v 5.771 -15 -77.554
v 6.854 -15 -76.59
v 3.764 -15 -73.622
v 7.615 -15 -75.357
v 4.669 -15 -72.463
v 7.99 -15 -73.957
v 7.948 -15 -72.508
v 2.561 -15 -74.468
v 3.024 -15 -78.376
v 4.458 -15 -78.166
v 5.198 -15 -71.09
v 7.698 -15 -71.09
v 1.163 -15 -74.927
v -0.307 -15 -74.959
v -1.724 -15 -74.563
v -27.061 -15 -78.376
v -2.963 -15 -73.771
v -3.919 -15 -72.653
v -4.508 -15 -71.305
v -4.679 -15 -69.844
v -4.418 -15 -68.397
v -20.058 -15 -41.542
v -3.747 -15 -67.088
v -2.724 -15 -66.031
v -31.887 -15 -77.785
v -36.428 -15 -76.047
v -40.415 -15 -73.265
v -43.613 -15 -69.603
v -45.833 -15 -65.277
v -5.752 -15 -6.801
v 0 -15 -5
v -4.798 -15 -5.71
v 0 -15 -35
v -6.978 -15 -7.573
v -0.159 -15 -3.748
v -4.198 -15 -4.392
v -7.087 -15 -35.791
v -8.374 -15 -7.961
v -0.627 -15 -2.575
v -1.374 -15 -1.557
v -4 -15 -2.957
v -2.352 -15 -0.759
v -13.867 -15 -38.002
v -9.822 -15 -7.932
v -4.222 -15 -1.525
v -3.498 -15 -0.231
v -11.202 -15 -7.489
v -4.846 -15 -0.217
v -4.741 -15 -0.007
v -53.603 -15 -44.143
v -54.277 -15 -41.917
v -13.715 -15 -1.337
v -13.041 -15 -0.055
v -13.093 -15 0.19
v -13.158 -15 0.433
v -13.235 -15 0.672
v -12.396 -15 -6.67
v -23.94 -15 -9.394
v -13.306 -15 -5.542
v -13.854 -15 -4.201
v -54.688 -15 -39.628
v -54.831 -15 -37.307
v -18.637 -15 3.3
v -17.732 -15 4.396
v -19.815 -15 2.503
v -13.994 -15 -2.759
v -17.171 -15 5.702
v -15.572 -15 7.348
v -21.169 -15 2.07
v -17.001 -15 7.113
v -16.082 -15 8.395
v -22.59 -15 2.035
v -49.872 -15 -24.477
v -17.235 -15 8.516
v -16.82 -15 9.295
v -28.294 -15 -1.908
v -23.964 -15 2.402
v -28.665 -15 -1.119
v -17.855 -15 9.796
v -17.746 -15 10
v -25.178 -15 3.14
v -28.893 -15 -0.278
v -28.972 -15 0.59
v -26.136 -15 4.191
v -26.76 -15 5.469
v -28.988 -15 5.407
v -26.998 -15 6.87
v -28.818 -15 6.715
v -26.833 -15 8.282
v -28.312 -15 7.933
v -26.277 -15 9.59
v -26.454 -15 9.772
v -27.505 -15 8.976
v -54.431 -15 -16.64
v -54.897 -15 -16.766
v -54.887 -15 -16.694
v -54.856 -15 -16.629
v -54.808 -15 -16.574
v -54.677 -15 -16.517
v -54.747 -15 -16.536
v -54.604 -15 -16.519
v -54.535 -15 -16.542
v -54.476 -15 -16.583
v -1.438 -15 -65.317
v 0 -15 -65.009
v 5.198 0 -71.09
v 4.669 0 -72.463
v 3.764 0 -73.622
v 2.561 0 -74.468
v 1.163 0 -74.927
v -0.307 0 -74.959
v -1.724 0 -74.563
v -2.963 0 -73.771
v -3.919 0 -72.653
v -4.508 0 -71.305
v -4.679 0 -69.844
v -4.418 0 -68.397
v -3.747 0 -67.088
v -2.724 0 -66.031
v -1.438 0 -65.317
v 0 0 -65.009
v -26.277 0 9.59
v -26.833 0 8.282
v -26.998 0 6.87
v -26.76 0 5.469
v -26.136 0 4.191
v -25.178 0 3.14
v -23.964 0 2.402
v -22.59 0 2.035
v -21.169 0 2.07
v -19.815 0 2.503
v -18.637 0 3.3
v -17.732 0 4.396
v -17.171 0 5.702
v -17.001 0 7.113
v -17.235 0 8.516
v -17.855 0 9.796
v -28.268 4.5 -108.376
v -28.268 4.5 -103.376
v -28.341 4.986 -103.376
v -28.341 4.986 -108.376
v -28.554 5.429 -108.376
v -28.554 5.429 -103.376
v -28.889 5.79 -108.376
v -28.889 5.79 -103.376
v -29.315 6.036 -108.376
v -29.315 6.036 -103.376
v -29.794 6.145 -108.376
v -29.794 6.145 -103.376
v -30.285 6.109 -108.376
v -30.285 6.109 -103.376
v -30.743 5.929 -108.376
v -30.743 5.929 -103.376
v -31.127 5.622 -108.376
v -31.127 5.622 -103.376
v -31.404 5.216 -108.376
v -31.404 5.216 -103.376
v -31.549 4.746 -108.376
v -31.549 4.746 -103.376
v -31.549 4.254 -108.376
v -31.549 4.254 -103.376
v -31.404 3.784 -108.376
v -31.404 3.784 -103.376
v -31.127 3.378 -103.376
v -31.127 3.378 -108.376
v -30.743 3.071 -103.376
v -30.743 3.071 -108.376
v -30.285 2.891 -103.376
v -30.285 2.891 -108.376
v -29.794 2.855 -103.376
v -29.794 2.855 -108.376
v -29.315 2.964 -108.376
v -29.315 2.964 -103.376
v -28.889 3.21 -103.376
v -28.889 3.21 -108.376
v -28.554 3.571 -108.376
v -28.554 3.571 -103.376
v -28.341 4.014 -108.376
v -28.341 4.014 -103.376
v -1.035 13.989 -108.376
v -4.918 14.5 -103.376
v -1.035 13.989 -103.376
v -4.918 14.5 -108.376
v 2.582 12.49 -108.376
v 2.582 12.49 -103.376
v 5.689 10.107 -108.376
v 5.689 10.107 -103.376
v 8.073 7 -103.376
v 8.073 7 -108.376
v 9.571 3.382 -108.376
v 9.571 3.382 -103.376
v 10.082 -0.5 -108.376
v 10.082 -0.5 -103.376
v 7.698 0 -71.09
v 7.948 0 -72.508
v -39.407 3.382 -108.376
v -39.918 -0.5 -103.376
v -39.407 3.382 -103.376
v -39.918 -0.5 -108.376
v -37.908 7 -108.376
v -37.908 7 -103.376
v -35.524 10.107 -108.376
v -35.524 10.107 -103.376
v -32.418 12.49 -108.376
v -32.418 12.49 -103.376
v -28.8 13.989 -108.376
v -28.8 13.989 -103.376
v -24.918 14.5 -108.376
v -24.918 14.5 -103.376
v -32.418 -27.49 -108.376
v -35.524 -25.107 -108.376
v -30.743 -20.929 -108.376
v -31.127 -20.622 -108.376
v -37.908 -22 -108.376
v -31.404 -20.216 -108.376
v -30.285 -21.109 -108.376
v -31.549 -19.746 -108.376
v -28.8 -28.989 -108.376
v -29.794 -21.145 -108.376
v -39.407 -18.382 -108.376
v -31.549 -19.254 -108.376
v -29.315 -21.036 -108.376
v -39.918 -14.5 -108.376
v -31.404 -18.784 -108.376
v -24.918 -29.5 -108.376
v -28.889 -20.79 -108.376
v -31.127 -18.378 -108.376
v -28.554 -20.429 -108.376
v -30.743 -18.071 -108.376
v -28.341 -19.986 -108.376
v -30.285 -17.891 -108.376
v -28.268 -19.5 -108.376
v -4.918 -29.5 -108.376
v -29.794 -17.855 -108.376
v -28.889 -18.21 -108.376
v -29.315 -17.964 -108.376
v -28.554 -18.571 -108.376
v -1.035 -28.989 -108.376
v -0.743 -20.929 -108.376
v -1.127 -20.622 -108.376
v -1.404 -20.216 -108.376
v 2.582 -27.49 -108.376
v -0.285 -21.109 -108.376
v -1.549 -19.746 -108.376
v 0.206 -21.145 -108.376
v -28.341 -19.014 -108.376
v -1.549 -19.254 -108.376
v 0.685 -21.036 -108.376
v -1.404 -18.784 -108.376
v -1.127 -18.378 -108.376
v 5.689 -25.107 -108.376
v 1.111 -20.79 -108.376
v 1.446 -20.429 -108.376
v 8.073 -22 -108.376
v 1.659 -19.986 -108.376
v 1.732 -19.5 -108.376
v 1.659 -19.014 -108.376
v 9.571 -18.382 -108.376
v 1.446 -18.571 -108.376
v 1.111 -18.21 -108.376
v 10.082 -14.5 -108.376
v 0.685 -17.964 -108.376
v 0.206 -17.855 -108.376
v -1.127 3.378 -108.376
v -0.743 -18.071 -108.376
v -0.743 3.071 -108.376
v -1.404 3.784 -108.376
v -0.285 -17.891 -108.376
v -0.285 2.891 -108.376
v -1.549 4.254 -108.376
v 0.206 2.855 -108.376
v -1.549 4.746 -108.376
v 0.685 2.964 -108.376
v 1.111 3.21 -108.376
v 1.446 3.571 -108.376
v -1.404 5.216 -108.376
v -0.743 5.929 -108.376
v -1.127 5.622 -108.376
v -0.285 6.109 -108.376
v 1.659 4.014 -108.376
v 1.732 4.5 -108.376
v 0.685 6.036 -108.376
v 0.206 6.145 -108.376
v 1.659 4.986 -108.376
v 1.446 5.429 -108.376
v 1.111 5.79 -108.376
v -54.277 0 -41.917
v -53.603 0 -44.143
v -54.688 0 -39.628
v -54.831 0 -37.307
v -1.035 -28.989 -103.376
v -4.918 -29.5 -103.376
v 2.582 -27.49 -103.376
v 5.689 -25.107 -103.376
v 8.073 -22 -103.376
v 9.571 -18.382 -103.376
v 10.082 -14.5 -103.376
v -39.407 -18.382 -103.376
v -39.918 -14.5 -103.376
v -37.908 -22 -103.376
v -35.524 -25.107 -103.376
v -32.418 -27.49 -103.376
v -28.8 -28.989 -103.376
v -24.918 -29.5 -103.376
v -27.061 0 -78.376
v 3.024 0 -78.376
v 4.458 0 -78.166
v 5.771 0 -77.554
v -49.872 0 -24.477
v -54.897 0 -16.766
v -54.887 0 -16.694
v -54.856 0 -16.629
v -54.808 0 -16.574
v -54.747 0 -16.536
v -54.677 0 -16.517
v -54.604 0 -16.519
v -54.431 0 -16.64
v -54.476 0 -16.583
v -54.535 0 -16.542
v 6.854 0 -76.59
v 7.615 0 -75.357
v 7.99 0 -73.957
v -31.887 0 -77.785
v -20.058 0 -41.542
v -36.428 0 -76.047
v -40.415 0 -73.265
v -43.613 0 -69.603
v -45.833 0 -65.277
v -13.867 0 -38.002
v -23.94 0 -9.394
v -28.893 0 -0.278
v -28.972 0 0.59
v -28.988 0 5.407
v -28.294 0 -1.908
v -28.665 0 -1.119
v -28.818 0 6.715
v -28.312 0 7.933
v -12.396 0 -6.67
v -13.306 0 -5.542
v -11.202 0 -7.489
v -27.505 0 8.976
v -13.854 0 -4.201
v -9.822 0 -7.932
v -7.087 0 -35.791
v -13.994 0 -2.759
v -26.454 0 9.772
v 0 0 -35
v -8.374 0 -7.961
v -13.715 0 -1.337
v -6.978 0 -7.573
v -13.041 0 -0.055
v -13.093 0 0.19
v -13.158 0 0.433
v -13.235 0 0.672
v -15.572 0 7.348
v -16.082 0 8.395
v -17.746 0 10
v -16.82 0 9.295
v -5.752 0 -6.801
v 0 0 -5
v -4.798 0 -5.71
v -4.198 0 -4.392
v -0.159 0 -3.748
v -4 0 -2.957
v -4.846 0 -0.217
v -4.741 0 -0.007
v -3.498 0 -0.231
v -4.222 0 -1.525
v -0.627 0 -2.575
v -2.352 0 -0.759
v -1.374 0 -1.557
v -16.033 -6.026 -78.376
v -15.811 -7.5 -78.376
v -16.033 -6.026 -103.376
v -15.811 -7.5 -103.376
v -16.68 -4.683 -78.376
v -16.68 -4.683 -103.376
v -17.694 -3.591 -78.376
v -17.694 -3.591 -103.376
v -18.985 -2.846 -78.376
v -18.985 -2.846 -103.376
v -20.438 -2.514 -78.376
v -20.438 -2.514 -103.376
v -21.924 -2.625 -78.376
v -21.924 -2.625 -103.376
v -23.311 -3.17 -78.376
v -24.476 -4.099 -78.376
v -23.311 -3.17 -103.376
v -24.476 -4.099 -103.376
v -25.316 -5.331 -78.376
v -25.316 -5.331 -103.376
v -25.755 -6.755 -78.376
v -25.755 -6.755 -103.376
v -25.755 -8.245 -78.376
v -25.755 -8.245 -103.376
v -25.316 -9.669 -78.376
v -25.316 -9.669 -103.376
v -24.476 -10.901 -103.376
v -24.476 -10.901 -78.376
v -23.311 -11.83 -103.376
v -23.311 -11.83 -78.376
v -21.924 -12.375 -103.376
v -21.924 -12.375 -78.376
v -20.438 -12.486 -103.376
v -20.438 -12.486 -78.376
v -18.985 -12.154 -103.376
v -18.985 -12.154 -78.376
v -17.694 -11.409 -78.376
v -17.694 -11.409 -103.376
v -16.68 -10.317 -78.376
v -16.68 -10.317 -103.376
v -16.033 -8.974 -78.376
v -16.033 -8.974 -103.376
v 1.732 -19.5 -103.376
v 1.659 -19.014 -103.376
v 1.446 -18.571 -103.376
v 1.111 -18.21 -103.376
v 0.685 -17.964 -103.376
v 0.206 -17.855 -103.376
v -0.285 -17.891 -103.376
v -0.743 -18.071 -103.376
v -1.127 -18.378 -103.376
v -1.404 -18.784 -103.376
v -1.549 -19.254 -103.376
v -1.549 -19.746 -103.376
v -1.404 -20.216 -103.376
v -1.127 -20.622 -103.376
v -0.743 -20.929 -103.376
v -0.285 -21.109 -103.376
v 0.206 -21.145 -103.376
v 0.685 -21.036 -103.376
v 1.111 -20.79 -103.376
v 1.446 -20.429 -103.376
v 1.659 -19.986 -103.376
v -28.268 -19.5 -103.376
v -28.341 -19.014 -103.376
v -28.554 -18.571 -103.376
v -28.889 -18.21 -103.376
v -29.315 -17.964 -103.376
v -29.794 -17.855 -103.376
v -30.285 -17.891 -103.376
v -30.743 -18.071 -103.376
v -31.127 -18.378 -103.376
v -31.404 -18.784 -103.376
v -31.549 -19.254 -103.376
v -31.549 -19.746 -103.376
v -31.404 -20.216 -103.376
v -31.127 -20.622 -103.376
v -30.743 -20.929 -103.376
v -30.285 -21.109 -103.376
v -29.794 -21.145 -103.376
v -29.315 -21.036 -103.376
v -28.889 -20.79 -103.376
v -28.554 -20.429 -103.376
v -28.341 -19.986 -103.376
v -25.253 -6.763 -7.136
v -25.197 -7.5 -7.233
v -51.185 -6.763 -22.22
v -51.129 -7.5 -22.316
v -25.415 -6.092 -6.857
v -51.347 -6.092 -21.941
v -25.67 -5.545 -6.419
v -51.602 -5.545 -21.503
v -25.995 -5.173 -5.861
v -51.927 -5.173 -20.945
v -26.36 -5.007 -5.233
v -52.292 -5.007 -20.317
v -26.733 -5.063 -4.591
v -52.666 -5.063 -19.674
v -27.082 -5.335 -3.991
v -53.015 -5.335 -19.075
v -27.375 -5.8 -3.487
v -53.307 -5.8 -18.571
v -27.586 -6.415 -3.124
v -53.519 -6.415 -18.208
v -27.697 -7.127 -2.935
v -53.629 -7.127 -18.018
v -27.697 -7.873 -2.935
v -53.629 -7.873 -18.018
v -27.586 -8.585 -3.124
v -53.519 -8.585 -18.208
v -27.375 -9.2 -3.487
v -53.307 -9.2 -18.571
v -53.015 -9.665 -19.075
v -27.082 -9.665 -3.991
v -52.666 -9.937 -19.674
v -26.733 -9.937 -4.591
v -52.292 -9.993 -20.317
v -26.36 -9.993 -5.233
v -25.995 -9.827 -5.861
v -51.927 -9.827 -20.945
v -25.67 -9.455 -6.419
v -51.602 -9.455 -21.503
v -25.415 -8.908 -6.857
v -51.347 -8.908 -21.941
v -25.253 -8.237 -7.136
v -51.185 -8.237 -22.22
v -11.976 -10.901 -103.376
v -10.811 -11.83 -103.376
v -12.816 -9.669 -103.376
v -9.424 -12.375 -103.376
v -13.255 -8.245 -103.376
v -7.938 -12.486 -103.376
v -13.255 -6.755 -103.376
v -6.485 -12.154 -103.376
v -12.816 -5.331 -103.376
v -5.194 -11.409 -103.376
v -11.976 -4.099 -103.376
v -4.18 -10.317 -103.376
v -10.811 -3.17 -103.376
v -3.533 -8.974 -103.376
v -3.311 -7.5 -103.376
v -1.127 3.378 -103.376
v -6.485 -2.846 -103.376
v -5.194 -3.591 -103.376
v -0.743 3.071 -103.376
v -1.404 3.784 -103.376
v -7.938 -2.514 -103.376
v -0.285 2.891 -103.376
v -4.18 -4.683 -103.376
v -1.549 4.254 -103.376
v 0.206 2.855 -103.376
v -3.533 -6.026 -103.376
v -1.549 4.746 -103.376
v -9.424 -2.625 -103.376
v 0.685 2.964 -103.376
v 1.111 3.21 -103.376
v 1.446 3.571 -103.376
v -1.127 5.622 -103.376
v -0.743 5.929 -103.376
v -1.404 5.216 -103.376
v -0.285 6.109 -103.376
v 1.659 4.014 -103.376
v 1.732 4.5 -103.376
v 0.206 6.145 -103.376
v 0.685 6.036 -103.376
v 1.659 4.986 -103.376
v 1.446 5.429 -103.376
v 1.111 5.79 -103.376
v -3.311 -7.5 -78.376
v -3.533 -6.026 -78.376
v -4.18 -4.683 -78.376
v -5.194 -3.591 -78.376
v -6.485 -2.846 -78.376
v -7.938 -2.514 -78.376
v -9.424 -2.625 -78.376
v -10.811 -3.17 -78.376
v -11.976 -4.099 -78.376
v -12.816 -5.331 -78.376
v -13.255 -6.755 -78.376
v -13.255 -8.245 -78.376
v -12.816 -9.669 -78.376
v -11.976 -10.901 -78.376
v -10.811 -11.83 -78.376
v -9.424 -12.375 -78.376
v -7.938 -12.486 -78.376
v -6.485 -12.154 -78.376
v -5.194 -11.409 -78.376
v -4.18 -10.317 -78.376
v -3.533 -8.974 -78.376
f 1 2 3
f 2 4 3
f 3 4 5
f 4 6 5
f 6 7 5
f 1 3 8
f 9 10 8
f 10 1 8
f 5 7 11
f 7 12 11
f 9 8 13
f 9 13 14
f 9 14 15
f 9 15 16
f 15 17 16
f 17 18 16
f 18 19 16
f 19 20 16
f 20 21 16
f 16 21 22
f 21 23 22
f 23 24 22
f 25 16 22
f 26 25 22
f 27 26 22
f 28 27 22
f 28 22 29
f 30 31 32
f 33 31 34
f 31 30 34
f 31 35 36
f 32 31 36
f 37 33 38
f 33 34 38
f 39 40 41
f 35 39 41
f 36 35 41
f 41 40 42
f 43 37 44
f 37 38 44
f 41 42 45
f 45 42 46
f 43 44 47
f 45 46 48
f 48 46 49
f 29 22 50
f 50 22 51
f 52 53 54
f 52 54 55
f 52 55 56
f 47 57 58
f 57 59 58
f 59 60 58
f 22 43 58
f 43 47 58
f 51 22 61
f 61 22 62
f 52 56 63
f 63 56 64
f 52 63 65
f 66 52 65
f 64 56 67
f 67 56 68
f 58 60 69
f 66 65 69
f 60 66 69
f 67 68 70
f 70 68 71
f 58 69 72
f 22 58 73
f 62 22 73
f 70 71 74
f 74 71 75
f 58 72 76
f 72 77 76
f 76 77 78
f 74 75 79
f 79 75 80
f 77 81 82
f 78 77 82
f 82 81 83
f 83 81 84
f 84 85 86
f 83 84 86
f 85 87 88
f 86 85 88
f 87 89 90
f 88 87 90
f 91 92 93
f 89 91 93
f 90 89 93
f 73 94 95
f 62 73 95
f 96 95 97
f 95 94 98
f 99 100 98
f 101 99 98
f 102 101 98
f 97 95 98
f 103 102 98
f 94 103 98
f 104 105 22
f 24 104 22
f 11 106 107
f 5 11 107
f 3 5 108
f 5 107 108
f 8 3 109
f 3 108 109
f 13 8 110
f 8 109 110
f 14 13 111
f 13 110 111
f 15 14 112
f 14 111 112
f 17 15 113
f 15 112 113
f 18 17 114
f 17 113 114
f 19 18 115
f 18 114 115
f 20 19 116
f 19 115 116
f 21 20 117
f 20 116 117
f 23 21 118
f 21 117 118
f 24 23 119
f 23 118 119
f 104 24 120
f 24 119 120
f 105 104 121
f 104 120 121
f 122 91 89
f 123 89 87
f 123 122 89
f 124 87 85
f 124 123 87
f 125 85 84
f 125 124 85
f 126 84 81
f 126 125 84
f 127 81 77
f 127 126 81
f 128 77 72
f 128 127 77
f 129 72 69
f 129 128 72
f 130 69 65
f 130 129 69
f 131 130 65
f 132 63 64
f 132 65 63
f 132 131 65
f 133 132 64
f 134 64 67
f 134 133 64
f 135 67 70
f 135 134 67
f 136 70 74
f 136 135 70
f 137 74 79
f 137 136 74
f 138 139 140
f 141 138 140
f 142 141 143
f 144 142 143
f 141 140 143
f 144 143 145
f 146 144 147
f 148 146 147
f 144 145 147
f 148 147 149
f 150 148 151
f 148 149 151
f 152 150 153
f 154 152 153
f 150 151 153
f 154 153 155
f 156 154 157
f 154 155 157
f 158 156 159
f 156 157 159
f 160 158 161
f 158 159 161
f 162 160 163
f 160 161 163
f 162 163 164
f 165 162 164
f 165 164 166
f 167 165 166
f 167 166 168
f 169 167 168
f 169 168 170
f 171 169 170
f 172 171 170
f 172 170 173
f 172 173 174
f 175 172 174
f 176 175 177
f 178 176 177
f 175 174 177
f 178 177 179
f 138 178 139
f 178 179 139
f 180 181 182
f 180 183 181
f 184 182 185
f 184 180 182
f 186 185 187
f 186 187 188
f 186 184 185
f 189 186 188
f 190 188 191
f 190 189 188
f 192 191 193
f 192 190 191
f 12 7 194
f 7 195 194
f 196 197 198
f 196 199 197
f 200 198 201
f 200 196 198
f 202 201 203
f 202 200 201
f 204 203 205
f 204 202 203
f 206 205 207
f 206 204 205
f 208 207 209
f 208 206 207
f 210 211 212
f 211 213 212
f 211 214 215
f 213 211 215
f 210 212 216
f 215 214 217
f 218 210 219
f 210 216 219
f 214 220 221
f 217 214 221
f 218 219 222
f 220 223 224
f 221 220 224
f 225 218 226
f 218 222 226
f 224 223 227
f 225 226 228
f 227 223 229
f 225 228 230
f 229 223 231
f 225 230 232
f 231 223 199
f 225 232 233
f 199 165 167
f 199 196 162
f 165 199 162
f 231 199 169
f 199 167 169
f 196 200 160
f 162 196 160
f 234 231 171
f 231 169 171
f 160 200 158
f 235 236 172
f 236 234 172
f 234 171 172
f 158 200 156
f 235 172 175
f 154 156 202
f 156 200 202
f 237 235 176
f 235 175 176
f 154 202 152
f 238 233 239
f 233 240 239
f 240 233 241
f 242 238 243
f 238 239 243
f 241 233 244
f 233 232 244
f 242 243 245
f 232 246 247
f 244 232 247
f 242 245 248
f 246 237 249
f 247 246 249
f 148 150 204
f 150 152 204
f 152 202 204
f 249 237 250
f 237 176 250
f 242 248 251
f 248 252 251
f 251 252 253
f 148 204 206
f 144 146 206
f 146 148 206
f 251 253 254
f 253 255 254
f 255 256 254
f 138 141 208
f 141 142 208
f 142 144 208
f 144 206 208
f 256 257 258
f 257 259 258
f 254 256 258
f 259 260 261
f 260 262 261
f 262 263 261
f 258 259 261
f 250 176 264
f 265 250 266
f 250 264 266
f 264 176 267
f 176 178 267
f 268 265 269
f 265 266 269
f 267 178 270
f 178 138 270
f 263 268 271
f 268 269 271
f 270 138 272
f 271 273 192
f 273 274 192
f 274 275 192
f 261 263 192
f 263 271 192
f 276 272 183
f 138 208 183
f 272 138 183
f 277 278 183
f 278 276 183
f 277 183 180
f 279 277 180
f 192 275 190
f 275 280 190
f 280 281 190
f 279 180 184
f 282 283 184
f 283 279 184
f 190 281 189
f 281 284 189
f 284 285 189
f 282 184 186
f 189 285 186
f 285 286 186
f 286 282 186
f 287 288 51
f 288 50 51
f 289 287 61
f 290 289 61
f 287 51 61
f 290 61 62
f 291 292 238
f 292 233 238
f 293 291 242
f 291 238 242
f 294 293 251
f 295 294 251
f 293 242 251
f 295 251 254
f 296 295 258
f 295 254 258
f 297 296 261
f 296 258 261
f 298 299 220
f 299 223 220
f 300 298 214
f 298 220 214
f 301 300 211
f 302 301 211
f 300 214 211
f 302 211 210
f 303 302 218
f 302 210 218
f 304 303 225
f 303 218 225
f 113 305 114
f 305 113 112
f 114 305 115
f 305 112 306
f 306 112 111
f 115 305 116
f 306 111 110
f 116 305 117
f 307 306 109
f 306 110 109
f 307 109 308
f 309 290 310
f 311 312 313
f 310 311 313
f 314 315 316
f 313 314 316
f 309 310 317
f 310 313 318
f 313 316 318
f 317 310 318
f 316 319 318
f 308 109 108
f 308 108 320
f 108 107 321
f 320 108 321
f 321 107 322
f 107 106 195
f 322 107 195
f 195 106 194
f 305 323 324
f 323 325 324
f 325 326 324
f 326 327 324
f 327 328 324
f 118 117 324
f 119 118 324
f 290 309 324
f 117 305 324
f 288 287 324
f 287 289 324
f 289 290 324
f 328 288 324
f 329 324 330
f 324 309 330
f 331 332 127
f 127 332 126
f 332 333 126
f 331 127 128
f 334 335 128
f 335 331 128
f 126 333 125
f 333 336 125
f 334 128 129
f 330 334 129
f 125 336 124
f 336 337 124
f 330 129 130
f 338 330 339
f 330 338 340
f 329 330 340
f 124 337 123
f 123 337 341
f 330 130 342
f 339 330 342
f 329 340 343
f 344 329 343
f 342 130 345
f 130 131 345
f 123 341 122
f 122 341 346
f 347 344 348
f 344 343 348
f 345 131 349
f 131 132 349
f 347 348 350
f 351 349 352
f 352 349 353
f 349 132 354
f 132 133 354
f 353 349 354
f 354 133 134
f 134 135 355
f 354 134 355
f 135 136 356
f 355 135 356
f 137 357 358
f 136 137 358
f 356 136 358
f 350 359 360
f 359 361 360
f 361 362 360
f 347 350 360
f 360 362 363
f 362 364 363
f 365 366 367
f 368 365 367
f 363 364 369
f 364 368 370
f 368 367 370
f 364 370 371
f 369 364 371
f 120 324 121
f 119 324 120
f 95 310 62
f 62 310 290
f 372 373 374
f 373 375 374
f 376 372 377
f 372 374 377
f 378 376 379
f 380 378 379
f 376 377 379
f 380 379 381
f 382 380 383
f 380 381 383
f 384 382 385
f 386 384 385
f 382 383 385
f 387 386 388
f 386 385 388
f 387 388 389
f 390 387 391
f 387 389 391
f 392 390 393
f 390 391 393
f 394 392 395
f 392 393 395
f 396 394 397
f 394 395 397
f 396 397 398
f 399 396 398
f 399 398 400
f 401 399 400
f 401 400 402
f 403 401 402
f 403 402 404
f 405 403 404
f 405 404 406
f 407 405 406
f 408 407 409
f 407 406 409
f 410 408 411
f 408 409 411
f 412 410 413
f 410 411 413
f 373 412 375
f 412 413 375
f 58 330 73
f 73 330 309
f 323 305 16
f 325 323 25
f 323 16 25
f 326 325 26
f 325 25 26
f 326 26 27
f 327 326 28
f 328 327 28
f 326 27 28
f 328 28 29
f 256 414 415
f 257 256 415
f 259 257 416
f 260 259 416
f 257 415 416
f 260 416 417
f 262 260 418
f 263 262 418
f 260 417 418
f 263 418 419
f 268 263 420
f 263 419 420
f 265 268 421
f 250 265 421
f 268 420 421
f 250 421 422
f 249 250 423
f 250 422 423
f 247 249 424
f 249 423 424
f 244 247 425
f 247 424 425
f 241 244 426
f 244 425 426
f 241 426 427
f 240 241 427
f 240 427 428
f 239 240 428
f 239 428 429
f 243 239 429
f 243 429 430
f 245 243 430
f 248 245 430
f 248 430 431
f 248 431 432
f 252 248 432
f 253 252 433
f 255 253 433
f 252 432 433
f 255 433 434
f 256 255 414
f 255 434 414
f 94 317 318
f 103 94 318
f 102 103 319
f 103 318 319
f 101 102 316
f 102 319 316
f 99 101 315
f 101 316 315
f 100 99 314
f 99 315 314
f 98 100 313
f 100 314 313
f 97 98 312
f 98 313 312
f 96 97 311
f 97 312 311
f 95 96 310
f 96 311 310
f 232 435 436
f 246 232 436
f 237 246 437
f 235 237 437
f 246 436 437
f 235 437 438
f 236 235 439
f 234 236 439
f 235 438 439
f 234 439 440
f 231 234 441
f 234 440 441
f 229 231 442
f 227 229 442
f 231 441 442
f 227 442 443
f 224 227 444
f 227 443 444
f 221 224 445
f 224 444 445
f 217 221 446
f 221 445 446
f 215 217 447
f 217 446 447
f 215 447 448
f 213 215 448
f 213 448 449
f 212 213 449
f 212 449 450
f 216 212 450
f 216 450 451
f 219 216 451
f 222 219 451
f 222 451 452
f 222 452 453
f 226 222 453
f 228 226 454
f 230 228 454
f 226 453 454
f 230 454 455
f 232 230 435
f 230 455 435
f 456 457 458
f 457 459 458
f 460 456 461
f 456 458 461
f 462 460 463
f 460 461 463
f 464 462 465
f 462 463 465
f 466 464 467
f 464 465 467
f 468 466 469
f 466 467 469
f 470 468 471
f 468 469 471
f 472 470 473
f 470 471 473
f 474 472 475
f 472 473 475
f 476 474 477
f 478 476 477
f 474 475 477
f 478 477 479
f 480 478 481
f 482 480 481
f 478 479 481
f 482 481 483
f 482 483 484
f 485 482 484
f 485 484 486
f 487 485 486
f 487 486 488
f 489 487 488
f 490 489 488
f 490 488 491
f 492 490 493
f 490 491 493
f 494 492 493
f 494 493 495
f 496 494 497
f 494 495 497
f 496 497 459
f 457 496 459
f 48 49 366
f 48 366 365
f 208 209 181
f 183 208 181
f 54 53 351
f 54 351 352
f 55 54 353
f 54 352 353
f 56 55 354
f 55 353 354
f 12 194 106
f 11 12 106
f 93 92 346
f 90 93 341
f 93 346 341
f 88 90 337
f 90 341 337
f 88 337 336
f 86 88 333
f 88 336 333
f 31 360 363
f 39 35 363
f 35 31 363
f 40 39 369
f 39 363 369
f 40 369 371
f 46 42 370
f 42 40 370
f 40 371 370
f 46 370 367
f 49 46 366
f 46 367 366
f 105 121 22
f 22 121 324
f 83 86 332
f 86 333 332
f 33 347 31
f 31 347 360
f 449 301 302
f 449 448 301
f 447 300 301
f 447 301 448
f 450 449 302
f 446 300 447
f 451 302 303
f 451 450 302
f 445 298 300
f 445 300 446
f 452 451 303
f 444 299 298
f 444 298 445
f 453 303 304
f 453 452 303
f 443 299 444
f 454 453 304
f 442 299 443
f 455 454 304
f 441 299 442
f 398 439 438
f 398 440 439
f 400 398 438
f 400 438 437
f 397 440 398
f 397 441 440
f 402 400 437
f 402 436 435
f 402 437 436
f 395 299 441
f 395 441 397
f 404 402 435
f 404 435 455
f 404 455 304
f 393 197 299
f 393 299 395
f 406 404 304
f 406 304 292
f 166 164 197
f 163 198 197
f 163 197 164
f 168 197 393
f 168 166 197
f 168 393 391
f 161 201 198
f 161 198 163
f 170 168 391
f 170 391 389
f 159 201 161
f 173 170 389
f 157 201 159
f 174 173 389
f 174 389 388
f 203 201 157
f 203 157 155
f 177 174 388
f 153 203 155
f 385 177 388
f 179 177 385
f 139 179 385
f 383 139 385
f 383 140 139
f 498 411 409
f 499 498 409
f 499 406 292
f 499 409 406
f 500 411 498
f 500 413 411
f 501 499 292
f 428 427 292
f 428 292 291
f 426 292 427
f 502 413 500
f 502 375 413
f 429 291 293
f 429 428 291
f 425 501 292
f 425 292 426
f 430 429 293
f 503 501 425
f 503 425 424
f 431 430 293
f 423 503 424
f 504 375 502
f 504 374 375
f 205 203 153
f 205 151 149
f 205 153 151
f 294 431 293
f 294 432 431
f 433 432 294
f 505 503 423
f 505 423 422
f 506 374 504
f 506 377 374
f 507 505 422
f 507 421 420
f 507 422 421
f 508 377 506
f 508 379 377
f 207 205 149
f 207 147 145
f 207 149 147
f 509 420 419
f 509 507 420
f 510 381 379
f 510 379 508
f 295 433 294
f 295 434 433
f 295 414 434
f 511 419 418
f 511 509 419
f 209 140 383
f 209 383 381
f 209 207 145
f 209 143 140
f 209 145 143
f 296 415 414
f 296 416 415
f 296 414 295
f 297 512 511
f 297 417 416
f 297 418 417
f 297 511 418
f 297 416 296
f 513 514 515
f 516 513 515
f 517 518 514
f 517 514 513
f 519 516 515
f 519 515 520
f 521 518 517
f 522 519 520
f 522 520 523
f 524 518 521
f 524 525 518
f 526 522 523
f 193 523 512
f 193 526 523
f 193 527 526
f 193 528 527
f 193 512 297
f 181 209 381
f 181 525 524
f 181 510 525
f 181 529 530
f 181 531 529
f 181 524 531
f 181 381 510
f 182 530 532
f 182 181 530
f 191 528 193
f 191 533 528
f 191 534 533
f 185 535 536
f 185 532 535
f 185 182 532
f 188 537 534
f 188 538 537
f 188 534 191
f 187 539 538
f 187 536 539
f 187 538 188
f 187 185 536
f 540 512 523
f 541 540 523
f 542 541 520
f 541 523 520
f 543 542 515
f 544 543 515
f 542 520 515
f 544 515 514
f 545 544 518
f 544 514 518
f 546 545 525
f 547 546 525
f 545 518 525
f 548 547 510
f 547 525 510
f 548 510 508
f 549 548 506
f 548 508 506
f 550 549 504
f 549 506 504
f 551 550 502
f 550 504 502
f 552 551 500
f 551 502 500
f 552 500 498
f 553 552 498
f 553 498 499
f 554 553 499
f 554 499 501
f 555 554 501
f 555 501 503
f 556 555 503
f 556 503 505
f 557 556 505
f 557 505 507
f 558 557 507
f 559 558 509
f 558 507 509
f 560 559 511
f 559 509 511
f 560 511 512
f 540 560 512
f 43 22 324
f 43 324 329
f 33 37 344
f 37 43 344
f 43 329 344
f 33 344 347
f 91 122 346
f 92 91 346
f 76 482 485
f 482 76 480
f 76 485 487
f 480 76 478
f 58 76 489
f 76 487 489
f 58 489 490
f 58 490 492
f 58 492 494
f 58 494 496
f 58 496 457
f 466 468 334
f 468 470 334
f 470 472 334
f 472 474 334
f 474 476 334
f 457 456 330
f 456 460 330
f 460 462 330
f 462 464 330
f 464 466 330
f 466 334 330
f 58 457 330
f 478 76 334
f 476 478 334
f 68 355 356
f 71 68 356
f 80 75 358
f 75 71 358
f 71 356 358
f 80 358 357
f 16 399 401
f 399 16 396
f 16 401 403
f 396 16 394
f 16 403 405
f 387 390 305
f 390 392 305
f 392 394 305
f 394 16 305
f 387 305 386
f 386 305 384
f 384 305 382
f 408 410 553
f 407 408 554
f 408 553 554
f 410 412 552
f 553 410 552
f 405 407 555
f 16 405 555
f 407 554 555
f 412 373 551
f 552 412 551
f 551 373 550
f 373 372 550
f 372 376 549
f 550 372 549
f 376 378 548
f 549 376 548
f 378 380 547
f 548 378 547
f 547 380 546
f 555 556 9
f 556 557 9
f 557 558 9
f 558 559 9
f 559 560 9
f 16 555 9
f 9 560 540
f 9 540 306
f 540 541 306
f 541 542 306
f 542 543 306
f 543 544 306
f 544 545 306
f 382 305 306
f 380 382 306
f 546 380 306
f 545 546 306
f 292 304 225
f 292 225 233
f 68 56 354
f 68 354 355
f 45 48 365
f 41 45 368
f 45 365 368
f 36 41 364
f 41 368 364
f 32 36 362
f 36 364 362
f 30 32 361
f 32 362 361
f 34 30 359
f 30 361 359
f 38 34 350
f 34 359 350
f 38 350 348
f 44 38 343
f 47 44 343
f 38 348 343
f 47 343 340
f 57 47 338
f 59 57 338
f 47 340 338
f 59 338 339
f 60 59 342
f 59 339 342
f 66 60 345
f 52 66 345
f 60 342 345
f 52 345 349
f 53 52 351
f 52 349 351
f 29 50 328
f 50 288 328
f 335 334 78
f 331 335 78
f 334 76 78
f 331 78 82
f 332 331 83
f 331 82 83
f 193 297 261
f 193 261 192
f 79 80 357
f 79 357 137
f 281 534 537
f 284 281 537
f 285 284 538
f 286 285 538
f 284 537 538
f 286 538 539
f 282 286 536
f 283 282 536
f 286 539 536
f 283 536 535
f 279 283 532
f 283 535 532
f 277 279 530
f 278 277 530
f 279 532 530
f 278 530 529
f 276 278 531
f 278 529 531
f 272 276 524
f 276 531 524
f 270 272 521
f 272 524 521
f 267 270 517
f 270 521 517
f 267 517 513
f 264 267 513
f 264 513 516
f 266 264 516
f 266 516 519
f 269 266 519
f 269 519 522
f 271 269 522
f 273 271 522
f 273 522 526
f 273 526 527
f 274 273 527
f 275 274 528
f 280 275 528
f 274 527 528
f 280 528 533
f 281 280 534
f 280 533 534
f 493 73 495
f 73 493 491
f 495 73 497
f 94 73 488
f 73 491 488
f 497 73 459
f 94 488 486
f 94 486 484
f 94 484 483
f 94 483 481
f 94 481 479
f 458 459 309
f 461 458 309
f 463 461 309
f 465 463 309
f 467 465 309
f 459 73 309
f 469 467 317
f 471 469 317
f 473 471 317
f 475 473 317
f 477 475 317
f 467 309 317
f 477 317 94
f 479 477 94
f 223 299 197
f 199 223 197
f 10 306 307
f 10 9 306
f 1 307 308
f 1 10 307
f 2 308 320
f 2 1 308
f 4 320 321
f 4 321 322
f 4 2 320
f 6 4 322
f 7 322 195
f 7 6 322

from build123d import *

# Parameters (mm, degrees)
SKETCH1_W                      = 5
SKETCH1_H                      = 25
BOSS_EXTRUDE1_DEPTH            = 10
BOSS_EXTRUDE2_DEPTH            = 2.5
BOSS_EXTRUDE3_START            = 2.5
BOSS_EXTRUDE3_DEPTH            = 2.5
SKETCH5_W                      = 50
SKETCH5_H                      = 44
SKETCH5_R                      = 1.65
BOSS_EXTRUDE4_DEPTH            = 5
DRAFT1_ANGLE                   = 60
DRAFT2_ANGLE                   = -10
SKETCH6_W                      = 5
SKETCH6_H                      = 15
SKETCH7_W                      = 5
SKETCH7_H                      = 15
SKETCH8_W                      = 5
SKETCH8_H                      = 25
F_10_0_10_DIAMETER_HOLE1_D     = 10
F_10_0_10_DIAMETER_HOLE1_DEPTH = 29.5
FILLET1_R                      = 5
FILLET2_R                      = 20
FILLET3_R                      = 15


with BuildPart() as part:
    # Sketch1 → Revolve1 (revolve)
    with BuildSketch(Plane(origin=(0, -7.5, 0), x_dir=(1, 0, 0), z_dir=(0, 1, 0))):
        with Locations((-5.811233855, 90.876419512)):
            Rectangle(SKETCH1_W, SKETCH1_H)
    revolve(axis=Axis((-8.311233855, -7.5, -103.376419512), (0, 0, 1)))

    # Sketch2 → Boss-Extrude1 (add)
    with BuildSketch(Plane(origin=(0, -2.5, 0), x_dir=(1, 0, 0), z_dir=(0, 1, 0))):
        with BuildLine():
            Line((-20.904218066, -4.060593221), (-17.745761276, -10))
            ThreePointArc((-17.745761276, -10), (-16.42436709, -8.86625844), (-15.571850751, -7.348145002))
            Line((-15.571850751, -7.348145002), (-13.235172111, -0.671920317))
            ThreePointArc((-13.235172111, -0.671920317), (-13.124251068, -0.312083076), (-13.040724348, 0.055081199))
            ThreePointArc((-13.040724348, 0.055081199), (-9.034250588, -1.999882688), (-5, 0))
            ThreePointArc((-5, 0), (-1.464466094, 1.464466094), (0, 5))
            Line((0, 5), (0, 35))
            ThreePointArc((0, 35), (-10.533604853, 36.723434751), (-20.057952451, 41.541511272))
            Line((-20.057952451, 41.541511272), (5.197843412, 71.090018979))
            Line((5.197843412, 71.090018979), (8.982632418, 71.090018979))
            Line((8.982632418, 71.090018979), (8.982632418, 78.376419512))
            Line((8.982632418, 78.376419512), (-8.311233855, 78.376419512))
            Line((-8.311233855, 78.376419512), (-41.017367582, 78.376419512))
            Line((-41.017367582, 78.376419512), (-54.819345863, 40.83303933))
            Line((-54.819345863, 40.83303933), (-54.896976862, 16.766177236))
            ThreePointArc((-54.896976862, 16.766177236), (-54.712461515, 16.524099343), (-54.430876141, 16.639673113))
            Line((-54.430876141, 16.639673113), (-49.872077715, 24.477250263))
            Line((-49.872077715, 24.477250263), (-8.967847829, 0.684930874))
            Line((-8.967847829, 0.684930874), (-28.967743782, 0.74944331))
            Line((-28.967743782, 0.74944331), (-28.987601327, -5.406715976))
            ThreePointArc((-28.987601327, -5.406715976), (-28.311946244, -7.932877153), (-26.453503439, -9.772494077))
            Line((-26.453503439, -9.772494077), (-20.904218066, -4.060593221))
        make_face()
    extrude(amount=-BOSS_EXTRUDE1_DEPTH)

    # Sketch3 → Boss-Extrude2 (add)
    with BuildSketch(Plane.XZ.offset(12.5)):
        with BuildLine():
            Line((-20.904218066, 4.060593221), (-17.745761276, 10))
            ThreePointArc((-17.745761276, 10), (-16.42436709, 8.86625844), (-15.571850751, 7.348145002))
            Line((-15.571850751, 7.348145002), (-13.235172111, 0.671920317))
            ThreePointArc((-13.235172111, 0.671920317), (-13.124251068, 0.312083076), (-13.040724348, -0.055081199))
            ThreePointArc((-13.040724348, -0.055081199), (-9.034250588, 1.999882688), (-5, 0))
            ThreePointArc((-5, 0), (-1.464466094, -1.464466094), (0, -5))
            Line((0, -5), (0, -35))
            ThreePointArc((0, -35), (-10.533604853, -36.723434751), (-20.057952451, -41.541511272))
            Line((-20.057952451, -41.541511272), (5.197843412, -71.090018979))
            Line((5.197843412, -71.090018979), (8.982632418, -71.090018979))
            Line((8.982632418, -71.090018979), (8.982632418, -78.376419512))
            Line((8.982632418, -78.376419512), (-41.017367582, -78.376419512))
            Line((-41.017367582, -78.376419512), (-54.819345863, -40.83303933))
            Line((-54.819345863, -40.83303933), (-54.896976862, -16.766177236))
            ThreePointArc((-54.896976862, -16.766177236), (-54.712461515, -16.524099343), (-54.430876141, -16.639673113))
            Line((-54.430876141, -16.639673113), (-49.872077715, -24.477250263))
            Line((-49.872077715, -24.477250263), (-8.967847829, -0.684930874))
            Line((-8.967847829, -0.684930874), (-28.967743782, -0.74944331))
            Line((-28.967743782, -0.74944331), (-28.987601327, 5.406715976))
            ThreePointArc((-28.987601327, 5.406715976), (-28.311946244, 7.932877153), (-26.453503439, 9.772494077))
            Line((-26.453503439, 9.772494077), (-20.904218066, 4.060593221))
        make_face()
    extrude(amount=BOSS_EXTRUDE2_DEPTH)

    # Sketch4 → Boss-Extrude3 (add)
    with BuildSketch(Plane(origin=(0, -2.5, 0), x_dir=(-1, 0, 0), z_dir=(0, 1, 0)).offset(BOSS_EXTRUDE3_START)):
        with BuildLine():
            Line((20.904218066, 4.060593221), (26.453503439, 9.772494077))
            ThreePointArc((26.453503439, 9.772494077), (28.311946244, 7.932877153), (28.987601327, 5.406715976))
            Line((28.987601327, 5.406715976), (28.967743782, -0.74944331))
            Line((28.967743782, -0.74944331), (8.967847829, -0.684930874))
            Line((8.967847829, -0.684930874), (49.872077715, -24.477250263))
            Line((49.872077715, -24.477250263), (54.430876141, -16.639673113))
            ThreePointArc((54.430876141, -16.639673113), (54.712461515, -16.524099343), (54.896976862, -16.766177236))
            Line((54.896976862, -16.766177236), (54.819345863, -40.83303933))
            Line((54.819345863, -40.83303933), (41.017367582, -78.376419512))
            Line((41.017367582, -78.376419512), (-8.982632418, -78.376419512))
            Line((-8.982632418, -78.376419512), (-8.982632418, -71.090018979))
            Line((-8.982632418, -71.090018979), (-5.197843412, -71.090018979))
            Line((-5.197843412, -71.090018979), (20.057952451, -41.541511272))
            ThreePointArc((20.057952451, -41.541511272), (10.533604853, -36.723434751), (0, -35))
            Line((0, -35), (0, -5))
            ThreePointArc((0, -5), (1.464466094, -1.464466094), (5, 0))
            ThreePointArc((5, 0), (9.034250588, 1.999882688), (13.040724348, -0.055081199))
            ThreePointArc((13.040724348, -0.055081199), (13.124251068, 0.312083076), (13.235172111, 0.671920317))
            Line((13.235172111, 0.671920317), (15.571850751, 7.348145002))
            ThreePointArc((15.571850751, 7.348145002), (16.42436709, 8.86625844), (17.745761276, 10))
            Line((17.745761276, 10), (20.904218066, 4.060593221))
        make_face()
    extrude(amount=-BOSS_EXTRUDE3_DEPTH)

    # Sketch5 → Boss-Extrude4 (add)
    with BuildSketch(Plane.XY.offset(-103.376419512)):
        with Locations((-14.91763051, -7.5)):
            Rectangle(SKETCH5_W, SKETCH5_H)
        with Locations((-29.91763051, -19.5)):
            Circle(SKETCH5_R, mode=Mode.SUBTRACT)
        with Locations((0.08236949, -19.5)):
            Circle(SKETCH5_R, mode=Mode.SUBTRACT)
        with Locations((0.08236949, 4.5)):
            Circle(SKETCH5_R, mode=Mode.SUBTRACT)
        with Locations((-29.91763051, 4.5)):
            Circle(SKETCH5_R, mode=Mode.SUBTRACT)
    extrude(amount=-BOSS_EXTRUDE4_DEPTH)

    # Draft1
    draft1_faces = [part.faces().sort_by_distance(p)[0] for p in [
        (-18.967795805, -7.5, -0.717187092),
    ]]
    draft(draft1_faces, Plane(origin=(-28.967743782, -12.5, -0.74944331), x_dir=(0.0032256218002524395, 0, -0.9999947976684688), z_dir=(-0.9999947976684688, 0, -0.0032256218002524395)), DRAFT1_ANGLE)

    # Draft2
    draft2_faces = [part.faces().sort_by_distance(p)[0] for p in [
        (8.982632418, -7.5, -74.733219246),
    ]]
    draft(draft2_faces, Plane(origin=(-8.311233855, -12.5, -78.376419512), x_dir=(-1, 0, 0), z_dir=(0, 0, -1)), DRAFT2_ANGLE)

    # Sketch6 → Cut-Revolve1 (revolve, cut)
    with BuildSketch(Plane.XY.offset(7)):
        with Locations((-19.5, -7.5)):
            Rectangle(SKETCH6_W, SKETCH6_H)
    revolve(axis=Axis((-22, 0, 7), (0, -1, 0)), mode=Mode.SUBTRACT)

    # Sketch7 → Cut-Revolve2 (revolve, cut)
    with BuildSketch(Plane(origin=(0, 0, -3), x_dir=(-1, 0, 0), z_dir=(0, 0, -1))):
        with Locations((6.5, -7.5)):
            Rectangle(SKETCH7_W, SKETCH7_H)
    revolve(axis=Axis((-9, -15, -3), (0, 1, 0)), mode=Mode.SUBTRACT)

    # Sketch8 → Revolve2 (revolve)
    with BuildSketch(Plane(origin=(0, -7.5, 0), x_dir=(1, 0, 0), z_dir=(0, 1, 0))):
        with Locations((-18.311233855, 90.876419512)):
            Rectangle(SKETCH8_W, SKETCH8_H)
    revolve(axis=Axis((-20.811233855, -7.5, -103.376419512), (0, 0, 1)))

    # Sketch9 → Revolve3 (revolve)
    with BuildSketch(Plane(origin=(0, -7.5, 0), x_dir=(1, 0, 0), z_dir=(0, 1, 0))):
        Polygon((-51.129054889, 22.316230044), (-52.386032062, 20.155209826), (-26.453789436, 5.071483748), (-25.196812263, 7.232503967), align=None)
    revolve(axis=Axis((-53.325247092, -7.5, -20.701512837), (0.8644080875330462, 0, 0.502790869256256)))

    # Ø10.0 (10) Diameter Hole1
    with Locations(Plane(origin=(0, -15, 0), x_dir=(-1, 0, 0), z_dir=(0, -1, 0))):
        with Locations((-0.318427602, 69.998551454)):
            Hole(F_10_0_10_DIAMETER_HOLE1_D / 2, depth=F_10_0_10_DIAMETER_HOLE1_DEPTH)

    # Chamfer1
    # the kernel refuses this chamfer: 0.262951912, 0.262770817 mm, written as the material it takes off along each edge
    with BuildSketch(Plane(origin=(-5, -15.679311202, 0), x_dir=(0.9996632496701223, 4.862291359988254e-15, -0.02594970633688609), z_dir=(0, 1, 0))) as chamfer1_piece_1:
        with BuildLine():
            Line((0.259497063, 0), (0.159812325, 0.213399124))
            ThreePointArc((0.159812325, 0.213399124), (0.082816569, 0.107621918), (0, 0))
            ThreePointArc((0, 0), (0.131972937, -0.001683257), (0.259497063, 0))
        make_face()
    extrude(amount=16.358622404, mode=Mode.SUBTRACT)

    # Fillet1
    fillet1_edges = [part.edges().sort_by_distance(p)[0] for p in [
        (-28.967743782, -7.5, -0.74944331),
        (8.982632418, -7.5, -78.376419512),
    ]]
    fillet(fillet1_edges, radius=FILLET1_R)

    # Fillet2
    fillet2_edges = [part.edges().sort_by_distance(p)[0] for p in [
        (-41.017367582, -7.5, -78.376419512),
        (-54.819345863, -7.5, -40.83303933),
    ]]
    fillet(fillet2_edges, radius=FILLET2_R)

    # Fillet3
    fillet3_edges = [part.edges().sort_by_distance(p)[0] for p in [
        (-39.91763051, -29.5, -105.876419512),
        (-39.91763051, 14.5, -105.876419512),
        (10.08236949, 14.5, -105.876419512),
        (10.08236949, -29.5, -105.876419512),
    ]]
    fillet(fillet3_edges, radius=FILLET3_R)


solid = part.part
